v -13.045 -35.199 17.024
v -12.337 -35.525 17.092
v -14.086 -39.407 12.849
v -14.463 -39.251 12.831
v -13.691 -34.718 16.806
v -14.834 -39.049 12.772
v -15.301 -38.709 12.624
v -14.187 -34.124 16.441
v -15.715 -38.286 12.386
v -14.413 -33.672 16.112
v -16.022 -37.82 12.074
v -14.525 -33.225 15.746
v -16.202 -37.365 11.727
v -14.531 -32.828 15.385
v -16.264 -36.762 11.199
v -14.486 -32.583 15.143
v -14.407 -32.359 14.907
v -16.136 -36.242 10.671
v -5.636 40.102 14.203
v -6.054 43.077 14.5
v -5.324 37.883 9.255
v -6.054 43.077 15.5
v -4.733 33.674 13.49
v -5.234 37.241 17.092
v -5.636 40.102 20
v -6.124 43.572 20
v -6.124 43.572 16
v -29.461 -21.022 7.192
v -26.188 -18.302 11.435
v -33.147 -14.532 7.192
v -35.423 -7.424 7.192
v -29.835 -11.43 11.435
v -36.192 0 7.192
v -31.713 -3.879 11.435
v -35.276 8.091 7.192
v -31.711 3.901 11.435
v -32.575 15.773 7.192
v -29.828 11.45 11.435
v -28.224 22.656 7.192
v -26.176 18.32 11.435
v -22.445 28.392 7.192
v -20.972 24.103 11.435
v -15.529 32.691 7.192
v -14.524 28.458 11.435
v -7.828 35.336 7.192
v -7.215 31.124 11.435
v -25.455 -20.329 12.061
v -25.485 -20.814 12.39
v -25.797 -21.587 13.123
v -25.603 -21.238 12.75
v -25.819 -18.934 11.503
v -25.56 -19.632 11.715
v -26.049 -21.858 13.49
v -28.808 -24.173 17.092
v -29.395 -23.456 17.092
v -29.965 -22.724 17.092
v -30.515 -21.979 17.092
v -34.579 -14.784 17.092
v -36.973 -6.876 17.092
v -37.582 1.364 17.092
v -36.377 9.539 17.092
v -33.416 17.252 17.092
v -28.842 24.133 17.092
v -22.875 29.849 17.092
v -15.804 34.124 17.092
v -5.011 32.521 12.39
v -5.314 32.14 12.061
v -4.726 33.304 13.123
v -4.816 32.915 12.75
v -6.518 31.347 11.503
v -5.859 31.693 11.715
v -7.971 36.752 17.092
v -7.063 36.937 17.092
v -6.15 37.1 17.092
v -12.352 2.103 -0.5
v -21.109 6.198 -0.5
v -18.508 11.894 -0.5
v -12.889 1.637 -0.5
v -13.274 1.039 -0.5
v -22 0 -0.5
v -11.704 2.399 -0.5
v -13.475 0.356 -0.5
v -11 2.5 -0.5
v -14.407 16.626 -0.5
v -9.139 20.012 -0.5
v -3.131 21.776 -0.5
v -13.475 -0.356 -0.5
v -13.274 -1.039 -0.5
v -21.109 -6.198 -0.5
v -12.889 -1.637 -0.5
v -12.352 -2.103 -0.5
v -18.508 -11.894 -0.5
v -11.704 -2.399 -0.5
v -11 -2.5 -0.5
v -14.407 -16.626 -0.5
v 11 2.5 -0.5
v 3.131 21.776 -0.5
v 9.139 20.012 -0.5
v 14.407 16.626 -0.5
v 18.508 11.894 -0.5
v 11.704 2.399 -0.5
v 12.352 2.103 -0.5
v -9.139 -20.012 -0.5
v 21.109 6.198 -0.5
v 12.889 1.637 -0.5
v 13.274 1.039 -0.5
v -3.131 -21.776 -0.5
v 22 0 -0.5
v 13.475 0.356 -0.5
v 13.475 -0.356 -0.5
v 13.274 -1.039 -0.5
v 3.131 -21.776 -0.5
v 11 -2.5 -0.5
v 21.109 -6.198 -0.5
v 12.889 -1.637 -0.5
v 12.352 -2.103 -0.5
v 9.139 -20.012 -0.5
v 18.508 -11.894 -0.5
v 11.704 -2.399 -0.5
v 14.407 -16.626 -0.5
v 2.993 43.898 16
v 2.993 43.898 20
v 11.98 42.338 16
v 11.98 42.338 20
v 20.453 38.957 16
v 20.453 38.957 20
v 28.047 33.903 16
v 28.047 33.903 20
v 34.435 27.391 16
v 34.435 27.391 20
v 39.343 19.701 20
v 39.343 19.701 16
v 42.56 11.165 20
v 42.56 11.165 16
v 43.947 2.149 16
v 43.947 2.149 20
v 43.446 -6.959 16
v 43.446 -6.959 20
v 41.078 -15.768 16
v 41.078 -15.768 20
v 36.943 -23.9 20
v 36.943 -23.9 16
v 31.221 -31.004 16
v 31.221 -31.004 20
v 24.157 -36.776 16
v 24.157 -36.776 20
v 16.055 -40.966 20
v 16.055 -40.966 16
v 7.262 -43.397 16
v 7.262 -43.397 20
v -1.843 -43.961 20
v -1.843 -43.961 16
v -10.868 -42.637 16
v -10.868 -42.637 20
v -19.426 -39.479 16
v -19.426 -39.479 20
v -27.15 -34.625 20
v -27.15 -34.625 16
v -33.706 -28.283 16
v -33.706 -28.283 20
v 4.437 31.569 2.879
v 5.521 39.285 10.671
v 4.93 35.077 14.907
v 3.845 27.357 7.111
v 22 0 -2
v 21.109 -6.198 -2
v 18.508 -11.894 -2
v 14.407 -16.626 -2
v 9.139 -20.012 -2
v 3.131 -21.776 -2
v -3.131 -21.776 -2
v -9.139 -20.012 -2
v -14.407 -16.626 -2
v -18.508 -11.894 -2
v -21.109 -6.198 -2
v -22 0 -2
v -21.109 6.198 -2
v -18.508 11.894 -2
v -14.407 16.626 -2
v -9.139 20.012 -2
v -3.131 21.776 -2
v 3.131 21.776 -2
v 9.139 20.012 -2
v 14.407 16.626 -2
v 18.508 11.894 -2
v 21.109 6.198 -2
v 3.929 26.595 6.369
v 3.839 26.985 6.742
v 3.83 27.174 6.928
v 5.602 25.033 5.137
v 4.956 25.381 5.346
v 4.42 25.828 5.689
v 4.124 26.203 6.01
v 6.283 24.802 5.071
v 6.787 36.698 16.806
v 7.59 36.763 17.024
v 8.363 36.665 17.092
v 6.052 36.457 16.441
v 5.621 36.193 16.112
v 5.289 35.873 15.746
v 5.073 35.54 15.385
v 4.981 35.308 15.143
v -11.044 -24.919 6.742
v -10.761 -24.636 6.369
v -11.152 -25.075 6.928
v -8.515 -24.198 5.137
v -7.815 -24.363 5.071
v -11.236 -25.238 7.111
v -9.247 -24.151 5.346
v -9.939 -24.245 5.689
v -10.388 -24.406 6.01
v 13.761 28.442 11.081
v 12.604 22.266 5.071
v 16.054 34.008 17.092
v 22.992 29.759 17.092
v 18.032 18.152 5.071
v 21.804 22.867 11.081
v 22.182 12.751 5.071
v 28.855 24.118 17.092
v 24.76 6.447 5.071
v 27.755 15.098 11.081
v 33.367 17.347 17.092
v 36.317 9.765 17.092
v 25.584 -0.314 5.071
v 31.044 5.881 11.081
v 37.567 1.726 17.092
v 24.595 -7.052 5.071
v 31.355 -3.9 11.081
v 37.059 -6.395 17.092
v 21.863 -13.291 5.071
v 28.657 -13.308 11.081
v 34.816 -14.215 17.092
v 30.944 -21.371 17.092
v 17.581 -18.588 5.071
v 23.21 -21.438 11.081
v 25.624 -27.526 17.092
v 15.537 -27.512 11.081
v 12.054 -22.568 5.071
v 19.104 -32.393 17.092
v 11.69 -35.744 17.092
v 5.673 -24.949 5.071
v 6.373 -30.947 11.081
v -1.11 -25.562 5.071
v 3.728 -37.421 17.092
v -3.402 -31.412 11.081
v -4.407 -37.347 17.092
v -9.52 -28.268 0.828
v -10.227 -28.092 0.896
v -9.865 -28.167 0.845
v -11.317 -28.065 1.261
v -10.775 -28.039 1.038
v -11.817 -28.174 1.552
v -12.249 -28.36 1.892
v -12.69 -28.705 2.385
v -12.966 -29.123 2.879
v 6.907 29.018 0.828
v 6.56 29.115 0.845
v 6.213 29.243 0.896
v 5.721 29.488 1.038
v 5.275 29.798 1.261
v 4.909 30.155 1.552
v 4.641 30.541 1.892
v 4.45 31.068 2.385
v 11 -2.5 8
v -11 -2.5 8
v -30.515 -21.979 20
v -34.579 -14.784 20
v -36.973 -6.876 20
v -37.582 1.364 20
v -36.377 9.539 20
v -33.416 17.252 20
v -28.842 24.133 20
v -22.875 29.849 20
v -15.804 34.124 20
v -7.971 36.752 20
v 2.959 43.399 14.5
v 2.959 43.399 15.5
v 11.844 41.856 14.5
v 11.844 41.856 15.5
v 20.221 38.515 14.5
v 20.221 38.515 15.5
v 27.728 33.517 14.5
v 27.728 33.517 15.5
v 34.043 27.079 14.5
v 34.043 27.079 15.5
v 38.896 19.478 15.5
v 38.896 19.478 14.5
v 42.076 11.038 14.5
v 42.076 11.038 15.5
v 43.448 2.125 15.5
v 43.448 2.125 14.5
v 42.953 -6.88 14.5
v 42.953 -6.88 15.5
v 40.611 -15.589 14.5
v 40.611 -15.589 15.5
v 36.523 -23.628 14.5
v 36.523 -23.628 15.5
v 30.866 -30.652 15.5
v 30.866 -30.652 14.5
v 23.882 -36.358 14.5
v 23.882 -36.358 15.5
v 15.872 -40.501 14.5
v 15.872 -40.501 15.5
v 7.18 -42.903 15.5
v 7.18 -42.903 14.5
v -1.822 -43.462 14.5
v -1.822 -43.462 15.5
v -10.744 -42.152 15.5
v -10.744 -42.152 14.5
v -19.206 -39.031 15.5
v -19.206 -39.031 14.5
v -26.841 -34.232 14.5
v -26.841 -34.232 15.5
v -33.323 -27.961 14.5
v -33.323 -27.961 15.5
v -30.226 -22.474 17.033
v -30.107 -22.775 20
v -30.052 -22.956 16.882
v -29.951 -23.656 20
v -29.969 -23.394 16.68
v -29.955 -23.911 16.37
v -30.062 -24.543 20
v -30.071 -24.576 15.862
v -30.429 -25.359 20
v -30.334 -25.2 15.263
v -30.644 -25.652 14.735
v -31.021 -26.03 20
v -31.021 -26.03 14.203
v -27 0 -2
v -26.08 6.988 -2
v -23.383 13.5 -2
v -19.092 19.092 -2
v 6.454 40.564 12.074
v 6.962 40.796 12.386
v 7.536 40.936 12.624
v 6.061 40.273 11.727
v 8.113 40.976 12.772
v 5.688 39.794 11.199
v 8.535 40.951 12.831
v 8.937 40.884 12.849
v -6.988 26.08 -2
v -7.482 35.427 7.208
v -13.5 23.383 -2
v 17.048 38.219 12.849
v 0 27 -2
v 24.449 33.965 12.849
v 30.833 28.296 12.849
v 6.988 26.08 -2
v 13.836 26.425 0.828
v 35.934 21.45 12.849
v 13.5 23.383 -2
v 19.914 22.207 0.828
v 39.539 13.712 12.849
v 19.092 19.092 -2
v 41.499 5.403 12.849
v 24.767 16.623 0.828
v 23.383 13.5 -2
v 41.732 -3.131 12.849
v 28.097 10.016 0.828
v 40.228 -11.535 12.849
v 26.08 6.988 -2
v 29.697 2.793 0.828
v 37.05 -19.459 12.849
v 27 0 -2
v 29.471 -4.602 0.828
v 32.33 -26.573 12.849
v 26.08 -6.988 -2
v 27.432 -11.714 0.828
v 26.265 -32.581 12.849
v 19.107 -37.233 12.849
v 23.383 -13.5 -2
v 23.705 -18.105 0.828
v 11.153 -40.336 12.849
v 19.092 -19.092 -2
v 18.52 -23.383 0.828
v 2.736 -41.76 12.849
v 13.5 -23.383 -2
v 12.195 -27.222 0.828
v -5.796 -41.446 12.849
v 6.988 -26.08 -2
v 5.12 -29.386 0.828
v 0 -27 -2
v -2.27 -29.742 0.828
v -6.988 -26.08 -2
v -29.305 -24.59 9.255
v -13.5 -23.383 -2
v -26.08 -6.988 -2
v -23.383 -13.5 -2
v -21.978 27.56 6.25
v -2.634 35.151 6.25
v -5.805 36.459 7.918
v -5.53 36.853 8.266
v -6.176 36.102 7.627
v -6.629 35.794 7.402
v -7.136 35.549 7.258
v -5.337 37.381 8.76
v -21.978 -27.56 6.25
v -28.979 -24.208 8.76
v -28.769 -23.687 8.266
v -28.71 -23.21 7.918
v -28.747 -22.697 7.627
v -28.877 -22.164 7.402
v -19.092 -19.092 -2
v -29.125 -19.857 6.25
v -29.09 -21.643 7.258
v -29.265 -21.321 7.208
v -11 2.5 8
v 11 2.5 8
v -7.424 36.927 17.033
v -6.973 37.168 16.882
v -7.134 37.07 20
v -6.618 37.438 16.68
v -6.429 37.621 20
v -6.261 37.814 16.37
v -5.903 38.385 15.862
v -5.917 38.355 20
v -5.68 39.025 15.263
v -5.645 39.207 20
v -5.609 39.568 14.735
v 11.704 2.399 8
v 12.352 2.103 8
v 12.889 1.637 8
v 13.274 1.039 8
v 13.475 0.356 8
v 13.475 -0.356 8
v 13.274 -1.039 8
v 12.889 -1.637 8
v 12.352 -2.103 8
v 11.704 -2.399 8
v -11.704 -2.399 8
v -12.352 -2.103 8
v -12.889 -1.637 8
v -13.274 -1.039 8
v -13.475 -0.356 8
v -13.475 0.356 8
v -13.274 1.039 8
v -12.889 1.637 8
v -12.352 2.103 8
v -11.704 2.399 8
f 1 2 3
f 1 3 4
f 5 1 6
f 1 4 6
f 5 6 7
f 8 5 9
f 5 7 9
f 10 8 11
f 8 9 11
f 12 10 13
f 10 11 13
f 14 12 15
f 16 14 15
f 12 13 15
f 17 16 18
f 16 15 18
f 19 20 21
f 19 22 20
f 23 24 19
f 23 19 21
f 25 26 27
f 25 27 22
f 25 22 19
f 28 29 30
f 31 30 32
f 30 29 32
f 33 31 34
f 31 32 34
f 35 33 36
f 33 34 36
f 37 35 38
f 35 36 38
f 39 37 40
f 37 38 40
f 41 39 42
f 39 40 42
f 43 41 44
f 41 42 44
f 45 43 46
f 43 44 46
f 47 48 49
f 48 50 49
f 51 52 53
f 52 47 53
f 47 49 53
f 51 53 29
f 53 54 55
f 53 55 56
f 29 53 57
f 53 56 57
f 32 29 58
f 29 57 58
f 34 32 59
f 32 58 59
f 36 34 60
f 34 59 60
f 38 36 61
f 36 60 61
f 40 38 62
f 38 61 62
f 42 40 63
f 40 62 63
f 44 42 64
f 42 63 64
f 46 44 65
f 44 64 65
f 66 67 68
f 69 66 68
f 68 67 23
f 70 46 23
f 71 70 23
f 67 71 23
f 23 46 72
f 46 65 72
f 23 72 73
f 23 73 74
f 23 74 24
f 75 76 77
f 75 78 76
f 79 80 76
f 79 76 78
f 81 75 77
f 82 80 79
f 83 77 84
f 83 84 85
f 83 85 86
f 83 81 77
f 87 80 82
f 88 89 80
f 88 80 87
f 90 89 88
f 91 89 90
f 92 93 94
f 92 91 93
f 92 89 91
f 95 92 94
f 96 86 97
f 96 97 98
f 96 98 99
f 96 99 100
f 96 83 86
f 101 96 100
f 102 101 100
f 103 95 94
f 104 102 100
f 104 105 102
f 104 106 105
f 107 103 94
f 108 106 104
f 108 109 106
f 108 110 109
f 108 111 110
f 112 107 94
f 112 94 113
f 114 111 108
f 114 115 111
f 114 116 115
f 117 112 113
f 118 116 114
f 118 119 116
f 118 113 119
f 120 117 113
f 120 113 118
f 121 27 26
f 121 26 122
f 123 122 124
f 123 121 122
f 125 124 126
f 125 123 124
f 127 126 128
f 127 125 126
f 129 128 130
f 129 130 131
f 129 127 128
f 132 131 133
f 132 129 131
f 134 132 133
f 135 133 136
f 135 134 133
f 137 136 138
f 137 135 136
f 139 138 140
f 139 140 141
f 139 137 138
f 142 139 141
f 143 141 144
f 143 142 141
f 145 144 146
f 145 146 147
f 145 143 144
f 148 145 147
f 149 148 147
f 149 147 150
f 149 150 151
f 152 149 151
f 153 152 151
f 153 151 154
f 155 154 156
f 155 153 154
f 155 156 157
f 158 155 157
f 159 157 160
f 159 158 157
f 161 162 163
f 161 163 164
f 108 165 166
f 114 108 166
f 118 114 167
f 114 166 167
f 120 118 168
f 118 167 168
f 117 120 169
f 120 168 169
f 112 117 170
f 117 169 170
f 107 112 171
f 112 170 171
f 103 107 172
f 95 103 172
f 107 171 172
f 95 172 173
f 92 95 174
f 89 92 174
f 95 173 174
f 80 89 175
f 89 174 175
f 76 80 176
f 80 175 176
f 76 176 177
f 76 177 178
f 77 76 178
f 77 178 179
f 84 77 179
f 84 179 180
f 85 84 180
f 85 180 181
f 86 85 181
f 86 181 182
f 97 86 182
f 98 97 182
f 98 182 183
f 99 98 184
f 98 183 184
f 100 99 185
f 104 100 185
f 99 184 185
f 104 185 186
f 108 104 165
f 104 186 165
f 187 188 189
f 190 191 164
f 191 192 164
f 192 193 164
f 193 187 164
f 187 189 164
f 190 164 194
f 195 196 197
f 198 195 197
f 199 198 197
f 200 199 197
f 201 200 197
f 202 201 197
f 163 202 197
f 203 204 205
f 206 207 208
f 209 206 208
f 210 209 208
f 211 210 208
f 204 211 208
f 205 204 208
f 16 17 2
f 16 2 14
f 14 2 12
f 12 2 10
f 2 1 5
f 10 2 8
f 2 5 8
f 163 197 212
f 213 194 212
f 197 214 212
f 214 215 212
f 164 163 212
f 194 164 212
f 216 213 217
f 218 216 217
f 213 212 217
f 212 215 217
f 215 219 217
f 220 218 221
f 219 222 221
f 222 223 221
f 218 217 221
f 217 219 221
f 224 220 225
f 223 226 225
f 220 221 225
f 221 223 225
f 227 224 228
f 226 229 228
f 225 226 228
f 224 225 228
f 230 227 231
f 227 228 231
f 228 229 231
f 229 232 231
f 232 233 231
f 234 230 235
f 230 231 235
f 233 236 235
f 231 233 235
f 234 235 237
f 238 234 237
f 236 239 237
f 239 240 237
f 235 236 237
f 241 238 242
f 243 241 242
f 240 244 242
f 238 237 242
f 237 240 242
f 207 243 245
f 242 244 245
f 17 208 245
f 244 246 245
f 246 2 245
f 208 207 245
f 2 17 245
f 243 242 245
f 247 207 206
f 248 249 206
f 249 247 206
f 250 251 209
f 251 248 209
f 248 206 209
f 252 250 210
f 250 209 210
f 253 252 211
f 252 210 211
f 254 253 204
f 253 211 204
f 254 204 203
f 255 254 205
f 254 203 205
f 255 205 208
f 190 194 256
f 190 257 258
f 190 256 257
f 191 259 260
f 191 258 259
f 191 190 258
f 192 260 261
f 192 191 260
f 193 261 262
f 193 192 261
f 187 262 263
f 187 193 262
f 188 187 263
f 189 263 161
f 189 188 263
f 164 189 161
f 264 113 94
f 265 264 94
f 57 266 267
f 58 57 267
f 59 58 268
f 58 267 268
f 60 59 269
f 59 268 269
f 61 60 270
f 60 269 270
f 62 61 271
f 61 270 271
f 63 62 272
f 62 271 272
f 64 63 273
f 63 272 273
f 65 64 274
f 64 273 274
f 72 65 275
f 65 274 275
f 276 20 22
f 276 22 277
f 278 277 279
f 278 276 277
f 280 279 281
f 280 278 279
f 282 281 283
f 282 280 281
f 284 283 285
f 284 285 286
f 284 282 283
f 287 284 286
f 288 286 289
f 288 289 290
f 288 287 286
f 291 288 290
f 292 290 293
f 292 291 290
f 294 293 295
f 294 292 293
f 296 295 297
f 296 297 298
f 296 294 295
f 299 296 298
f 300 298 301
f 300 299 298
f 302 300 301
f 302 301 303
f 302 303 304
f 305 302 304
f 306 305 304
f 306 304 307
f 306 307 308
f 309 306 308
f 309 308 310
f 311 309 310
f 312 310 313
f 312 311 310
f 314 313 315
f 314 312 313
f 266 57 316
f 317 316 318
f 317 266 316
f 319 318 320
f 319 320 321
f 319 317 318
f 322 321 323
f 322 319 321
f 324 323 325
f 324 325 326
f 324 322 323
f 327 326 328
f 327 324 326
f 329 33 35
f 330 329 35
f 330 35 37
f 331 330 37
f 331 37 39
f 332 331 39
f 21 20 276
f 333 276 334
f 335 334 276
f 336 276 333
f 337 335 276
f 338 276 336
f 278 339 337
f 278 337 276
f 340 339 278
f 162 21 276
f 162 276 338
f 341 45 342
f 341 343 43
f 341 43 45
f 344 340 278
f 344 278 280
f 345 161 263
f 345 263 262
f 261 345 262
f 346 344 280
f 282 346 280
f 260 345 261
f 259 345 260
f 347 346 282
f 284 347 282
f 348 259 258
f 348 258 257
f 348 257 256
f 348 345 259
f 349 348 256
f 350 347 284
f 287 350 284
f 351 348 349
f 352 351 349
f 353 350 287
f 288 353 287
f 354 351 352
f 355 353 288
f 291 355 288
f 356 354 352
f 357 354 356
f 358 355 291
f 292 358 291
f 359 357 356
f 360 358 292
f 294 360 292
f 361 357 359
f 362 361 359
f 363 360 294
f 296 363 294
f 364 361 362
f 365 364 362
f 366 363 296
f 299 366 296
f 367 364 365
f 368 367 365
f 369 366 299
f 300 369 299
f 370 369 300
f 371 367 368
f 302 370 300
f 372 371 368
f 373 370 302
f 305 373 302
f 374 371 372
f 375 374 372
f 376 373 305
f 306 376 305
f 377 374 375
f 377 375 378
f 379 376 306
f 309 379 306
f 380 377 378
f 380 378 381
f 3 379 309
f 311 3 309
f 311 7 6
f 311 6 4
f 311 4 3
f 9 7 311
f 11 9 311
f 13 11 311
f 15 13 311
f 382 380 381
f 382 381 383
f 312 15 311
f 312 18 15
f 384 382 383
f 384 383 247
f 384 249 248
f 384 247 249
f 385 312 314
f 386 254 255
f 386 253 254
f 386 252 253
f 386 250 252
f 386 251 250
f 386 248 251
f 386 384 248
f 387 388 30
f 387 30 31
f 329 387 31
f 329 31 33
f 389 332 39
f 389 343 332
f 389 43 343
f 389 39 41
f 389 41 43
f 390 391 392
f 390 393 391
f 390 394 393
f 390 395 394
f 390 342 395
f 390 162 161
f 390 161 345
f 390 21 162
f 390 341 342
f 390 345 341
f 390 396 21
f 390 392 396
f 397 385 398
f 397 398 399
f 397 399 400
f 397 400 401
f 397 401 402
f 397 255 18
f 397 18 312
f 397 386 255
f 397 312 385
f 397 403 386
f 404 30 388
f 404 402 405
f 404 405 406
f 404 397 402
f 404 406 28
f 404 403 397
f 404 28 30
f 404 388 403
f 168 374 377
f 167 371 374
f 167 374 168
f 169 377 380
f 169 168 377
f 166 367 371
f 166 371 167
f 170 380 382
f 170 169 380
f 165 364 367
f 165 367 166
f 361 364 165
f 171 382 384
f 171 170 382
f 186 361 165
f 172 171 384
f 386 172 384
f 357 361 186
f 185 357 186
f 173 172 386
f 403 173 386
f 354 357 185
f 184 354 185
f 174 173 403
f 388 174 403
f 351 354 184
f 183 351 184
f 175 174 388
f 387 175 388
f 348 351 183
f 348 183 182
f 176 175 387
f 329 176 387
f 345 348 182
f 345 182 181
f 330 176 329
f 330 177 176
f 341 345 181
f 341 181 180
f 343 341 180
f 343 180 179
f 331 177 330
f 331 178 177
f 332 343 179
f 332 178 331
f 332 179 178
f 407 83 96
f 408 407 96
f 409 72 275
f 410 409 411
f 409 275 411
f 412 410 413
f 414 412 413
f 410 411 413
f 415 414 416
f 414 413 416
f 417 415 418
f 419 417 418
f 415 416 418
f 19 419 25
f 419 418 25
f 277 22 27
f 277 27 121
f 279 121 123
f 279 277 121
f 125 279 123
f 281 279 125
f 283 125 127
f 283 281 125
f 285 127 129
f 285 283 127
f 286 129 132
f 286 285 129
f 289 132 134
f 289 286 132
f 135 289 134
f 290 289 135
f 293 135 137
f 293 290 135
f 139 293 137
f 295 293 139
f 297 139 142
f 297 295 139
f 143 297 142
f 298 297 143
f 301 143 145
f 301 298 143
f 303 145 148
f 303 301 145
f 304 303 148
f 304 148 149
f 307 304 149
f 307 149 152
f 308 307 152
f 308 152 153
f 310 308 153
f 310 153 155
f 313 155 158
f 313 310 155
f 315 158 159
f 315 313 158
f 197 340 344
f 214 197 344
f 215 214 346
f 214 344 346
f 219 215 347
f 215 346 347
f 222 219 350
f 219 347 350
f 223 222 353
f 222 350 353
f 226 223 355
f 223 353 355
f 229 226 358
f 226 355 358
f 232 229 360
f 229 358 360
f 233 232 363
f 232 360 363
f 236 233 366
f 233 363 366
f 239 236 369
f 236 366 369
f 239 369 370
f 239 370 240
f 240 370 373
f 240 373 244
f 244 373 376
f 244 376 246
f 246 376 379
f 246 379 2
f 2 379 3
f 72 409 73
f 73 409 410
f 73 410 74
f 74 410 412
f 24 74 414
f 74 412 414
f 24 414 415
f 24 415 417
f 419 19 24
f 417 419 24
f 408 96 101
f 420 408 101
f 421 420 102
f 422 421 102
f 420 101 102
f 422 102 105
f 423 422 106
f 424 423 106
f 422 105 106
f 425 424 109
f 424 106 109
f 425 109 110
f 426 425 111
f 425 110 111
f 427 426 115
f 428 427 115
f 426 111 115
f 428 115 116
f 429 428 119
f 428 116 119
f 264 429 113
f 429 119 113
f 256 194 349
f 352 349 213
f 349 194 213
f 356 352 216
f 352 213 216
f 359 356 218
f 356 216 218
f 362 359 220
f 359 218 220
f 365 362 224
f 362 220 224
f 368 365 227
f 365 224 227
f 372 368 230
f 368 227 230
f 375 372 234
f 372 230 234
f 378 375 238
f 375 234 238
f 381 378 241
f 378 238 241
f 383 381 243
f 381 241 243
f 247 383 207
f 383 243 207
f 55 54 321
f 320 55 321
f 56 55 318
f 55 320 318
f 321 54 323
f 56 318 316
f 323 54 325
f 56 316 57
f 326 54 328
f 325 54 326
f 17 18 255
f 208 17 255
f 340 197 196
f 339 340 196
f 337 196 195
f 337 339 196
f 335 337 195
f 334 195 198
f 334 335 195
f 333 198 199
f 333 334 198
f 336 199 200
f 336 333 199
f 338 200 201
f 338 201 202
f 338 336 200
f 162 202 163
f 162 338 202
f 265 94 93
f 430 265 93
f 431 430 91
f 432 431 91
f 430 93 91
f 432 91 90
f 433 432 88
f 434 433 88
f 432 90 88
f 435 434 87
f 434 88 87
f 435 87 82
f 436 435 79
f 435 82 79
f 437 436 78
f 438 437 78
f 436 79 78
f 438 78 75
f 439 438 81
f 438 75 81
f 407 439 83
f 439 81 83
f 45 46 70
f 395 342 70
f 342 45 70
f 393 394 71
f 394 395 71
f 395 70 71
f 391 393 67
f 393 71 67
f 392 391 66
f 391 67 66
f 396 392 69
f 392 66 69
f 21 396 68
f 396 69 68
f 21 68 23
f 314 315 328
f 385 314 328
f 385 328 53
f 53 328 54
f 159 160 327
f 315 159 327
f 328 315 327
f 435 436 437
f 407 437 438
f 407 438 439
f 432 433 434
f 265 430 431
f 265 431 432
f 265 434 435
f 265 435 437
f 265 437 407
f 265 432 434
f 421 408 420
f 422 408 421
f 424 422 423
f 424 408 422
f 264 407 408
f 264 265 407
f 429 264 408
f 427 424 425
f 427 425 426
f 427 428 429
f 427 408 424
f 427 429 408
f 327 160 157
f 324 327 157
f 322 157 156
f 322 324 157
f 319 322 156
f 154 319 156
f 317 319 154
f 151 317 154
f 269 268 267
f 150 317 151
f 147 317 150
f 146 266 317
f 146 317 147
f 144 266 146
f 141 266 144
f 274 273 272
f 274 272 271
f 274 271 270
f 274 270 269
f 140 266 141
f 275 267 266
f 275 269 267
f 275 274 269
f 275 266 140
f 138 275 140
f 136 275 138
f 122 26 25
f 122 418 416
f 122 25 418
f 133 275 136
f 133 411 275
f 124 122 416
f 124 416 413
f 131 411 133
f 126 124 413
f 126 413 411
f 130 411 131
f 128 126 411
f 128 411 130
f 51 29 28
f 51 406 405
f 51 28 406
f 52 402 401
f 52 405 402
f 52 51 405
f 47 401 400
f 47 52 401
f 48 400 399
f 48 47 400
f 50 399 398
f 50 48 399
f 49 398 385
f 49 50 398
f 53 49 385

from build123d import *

# Parameters (mm, degrees)
F3_W           = 8.3933982822
F3_H           = 16.3933982822
F4_ANGLE_BACK  = 40
F4_ANGLE       = 122
F6_ANGLE_START = 98
F6_ANGLE       = 196
F7_ANGLE_BACK  = 40
F7_ANGLE       = 122
F8_R           = 3
F8_2_R         = 3
F9_R           = 3
F13_DEPTH      = 10
F14_R          = 22
F15_DEPTH      = 1.5


with BuildPart() as f1:
    # F0 (on Front) → F1 (revolve)
    with BuildSketch(Plane.XZ):
        Polygon((-43.5, 14.5), (-27, -2), (0, -2), (0, 20), (-44, 20), (-44, 16), (-43.5, 15.5), align=None)
    revolve(axis=Axis((0, 0, 9.4880101401), (0, 0, -1)))


with BuildPart() as f4:
    # F3 (on Front) → F4 (revolve)
    with BuildSketch(Plane.XZ, mode=Mode.PRIVATE) as f4_sk:
        with Locations((-41.8033008589, 16.8033008589)):
            Rectangle(F3_W, F3_H)
    revolve(f4_sk.sketch.rotate(Axis((0, 0, 9.4880101401), (0, 0, -1)), -F4_ANGLE_BACK), axis=Axis((0, 0, 9.4880101401), (0, 0, -1)), revolution_arc=F4_ANGLE)

    # F8#2
    f8_2_edges = [f4.edges().sort_by_distance(p)[0] for p in [
        (-5.233827, 37.240617, 16.803301),
        (-28.808328, -24.173058, 16.803301),
    ]]
    fillet(f8_2_edges, radius=F8_2_R)


with BuildPart() as f6:
    # F5 (on Front) → F6 (revolve)
    with BuildSketch(Plane.XZ, mode=Mode.PRIVATE) as f6_sk:
        Polygon((-36.8994949366, -6.2426406871), (-25.5857864376, 5.0710678119), (-37.6066017178, 17.091883092), (-48.9203102168, 5.7781745931), align=None)
    revolve(f6_sk.sketch.rotate(Axis((0, 0, 9), (0, 0, -1)), F6_ANGLE_START), axis=Axis((0, 0, 9), (0, 0, -1)), revolution_arc=F6_ANGLE)

    # F9
    f9_edges = [f6.edges().sort_by_distance(p)[0] for p in [
        (4.348135, 30.938589, -0.585786),
        (6.021109, 42.842419, 11.435029),
        (-17.596833, -39.523134, 11.435029),
        (-12.707527, -28.541572, -0.585786),
    ]]
    fillet(f9_edges, radius=F9_R)


with BuildPart() as f7:
    # F2 (on Front) → F7 (revolve)
    with BuildSketch(Plane.XZ, mode=Mode.PRIVATE) as f7_sk:
        Polygon((-41.2877159425, 2.0970603683), (-31.9497474683, 11.4350288425), (-37.6066017178, 17.091883092), (-46.944570192, 7.7539146178), align=None)
    revolve(f7_sk.sketch.rotate(Axis((0, 0, 9), (0, 0, -1)), -F7_ANGLE_BACK), axis=Axis((0, 0, 9), (0, 0, -1)), revolution_arc=F7_ANGLE)

    # F8
    f8_edges = [f7.edges().sort_by_distance(p)[0] for p in [
        (-28.051576, -23.538067, 6.766045),
        (-5.096342, 36.262361, 6.766045),
    ]]
    fillet(f8_edges, radius=F8_R)


with BuildPart() as f1_1:
    add(f1.part)

    # F10: cut F7, F4, F6
    add(f7.part, mode=Mode.SUBTRACT)
    add(f4.part, mode=Mode.SUBTRACT)
    add(f6.part, mode=Mode.SUBTRACT)

    # F12 (on offset) → F13 (cut)
    with BuildSketch(Plane(origin=(0, 0, -2), x_dir=(1, 0, 0), z_dir=(0, 0, -1))):
        with BuildLine():
            ThreePointArc((-11, 2.5), (-13.5, 0), (-11, -2.5))
            Line((-11, -2.5), (0, -2.5))
            Line((0, -2.5), (11, -2.5))
            ThreePointArc((11, -2.5), (13.5, 0), (11, 2.5))
            Line((11, 2.5), (0, 2.5))
            Line((0, 2.5), (-11, 2.5))
        make_face()
    extrude(amount=-F13_DEPTH, mode=Mode.SUBTRACT)

    # F14 (on offset) → F15 (cut)
    with BuildSketch(Plane(origin=(0, 0, -2), x_dir=(1, 0, 0), z_dir=(0, 0, -1))):
        Circle(F14_R)
    extrude(amount=-F15_DEPTH, mode=Mode.SUBTRACT)


solid = f1_1.part
